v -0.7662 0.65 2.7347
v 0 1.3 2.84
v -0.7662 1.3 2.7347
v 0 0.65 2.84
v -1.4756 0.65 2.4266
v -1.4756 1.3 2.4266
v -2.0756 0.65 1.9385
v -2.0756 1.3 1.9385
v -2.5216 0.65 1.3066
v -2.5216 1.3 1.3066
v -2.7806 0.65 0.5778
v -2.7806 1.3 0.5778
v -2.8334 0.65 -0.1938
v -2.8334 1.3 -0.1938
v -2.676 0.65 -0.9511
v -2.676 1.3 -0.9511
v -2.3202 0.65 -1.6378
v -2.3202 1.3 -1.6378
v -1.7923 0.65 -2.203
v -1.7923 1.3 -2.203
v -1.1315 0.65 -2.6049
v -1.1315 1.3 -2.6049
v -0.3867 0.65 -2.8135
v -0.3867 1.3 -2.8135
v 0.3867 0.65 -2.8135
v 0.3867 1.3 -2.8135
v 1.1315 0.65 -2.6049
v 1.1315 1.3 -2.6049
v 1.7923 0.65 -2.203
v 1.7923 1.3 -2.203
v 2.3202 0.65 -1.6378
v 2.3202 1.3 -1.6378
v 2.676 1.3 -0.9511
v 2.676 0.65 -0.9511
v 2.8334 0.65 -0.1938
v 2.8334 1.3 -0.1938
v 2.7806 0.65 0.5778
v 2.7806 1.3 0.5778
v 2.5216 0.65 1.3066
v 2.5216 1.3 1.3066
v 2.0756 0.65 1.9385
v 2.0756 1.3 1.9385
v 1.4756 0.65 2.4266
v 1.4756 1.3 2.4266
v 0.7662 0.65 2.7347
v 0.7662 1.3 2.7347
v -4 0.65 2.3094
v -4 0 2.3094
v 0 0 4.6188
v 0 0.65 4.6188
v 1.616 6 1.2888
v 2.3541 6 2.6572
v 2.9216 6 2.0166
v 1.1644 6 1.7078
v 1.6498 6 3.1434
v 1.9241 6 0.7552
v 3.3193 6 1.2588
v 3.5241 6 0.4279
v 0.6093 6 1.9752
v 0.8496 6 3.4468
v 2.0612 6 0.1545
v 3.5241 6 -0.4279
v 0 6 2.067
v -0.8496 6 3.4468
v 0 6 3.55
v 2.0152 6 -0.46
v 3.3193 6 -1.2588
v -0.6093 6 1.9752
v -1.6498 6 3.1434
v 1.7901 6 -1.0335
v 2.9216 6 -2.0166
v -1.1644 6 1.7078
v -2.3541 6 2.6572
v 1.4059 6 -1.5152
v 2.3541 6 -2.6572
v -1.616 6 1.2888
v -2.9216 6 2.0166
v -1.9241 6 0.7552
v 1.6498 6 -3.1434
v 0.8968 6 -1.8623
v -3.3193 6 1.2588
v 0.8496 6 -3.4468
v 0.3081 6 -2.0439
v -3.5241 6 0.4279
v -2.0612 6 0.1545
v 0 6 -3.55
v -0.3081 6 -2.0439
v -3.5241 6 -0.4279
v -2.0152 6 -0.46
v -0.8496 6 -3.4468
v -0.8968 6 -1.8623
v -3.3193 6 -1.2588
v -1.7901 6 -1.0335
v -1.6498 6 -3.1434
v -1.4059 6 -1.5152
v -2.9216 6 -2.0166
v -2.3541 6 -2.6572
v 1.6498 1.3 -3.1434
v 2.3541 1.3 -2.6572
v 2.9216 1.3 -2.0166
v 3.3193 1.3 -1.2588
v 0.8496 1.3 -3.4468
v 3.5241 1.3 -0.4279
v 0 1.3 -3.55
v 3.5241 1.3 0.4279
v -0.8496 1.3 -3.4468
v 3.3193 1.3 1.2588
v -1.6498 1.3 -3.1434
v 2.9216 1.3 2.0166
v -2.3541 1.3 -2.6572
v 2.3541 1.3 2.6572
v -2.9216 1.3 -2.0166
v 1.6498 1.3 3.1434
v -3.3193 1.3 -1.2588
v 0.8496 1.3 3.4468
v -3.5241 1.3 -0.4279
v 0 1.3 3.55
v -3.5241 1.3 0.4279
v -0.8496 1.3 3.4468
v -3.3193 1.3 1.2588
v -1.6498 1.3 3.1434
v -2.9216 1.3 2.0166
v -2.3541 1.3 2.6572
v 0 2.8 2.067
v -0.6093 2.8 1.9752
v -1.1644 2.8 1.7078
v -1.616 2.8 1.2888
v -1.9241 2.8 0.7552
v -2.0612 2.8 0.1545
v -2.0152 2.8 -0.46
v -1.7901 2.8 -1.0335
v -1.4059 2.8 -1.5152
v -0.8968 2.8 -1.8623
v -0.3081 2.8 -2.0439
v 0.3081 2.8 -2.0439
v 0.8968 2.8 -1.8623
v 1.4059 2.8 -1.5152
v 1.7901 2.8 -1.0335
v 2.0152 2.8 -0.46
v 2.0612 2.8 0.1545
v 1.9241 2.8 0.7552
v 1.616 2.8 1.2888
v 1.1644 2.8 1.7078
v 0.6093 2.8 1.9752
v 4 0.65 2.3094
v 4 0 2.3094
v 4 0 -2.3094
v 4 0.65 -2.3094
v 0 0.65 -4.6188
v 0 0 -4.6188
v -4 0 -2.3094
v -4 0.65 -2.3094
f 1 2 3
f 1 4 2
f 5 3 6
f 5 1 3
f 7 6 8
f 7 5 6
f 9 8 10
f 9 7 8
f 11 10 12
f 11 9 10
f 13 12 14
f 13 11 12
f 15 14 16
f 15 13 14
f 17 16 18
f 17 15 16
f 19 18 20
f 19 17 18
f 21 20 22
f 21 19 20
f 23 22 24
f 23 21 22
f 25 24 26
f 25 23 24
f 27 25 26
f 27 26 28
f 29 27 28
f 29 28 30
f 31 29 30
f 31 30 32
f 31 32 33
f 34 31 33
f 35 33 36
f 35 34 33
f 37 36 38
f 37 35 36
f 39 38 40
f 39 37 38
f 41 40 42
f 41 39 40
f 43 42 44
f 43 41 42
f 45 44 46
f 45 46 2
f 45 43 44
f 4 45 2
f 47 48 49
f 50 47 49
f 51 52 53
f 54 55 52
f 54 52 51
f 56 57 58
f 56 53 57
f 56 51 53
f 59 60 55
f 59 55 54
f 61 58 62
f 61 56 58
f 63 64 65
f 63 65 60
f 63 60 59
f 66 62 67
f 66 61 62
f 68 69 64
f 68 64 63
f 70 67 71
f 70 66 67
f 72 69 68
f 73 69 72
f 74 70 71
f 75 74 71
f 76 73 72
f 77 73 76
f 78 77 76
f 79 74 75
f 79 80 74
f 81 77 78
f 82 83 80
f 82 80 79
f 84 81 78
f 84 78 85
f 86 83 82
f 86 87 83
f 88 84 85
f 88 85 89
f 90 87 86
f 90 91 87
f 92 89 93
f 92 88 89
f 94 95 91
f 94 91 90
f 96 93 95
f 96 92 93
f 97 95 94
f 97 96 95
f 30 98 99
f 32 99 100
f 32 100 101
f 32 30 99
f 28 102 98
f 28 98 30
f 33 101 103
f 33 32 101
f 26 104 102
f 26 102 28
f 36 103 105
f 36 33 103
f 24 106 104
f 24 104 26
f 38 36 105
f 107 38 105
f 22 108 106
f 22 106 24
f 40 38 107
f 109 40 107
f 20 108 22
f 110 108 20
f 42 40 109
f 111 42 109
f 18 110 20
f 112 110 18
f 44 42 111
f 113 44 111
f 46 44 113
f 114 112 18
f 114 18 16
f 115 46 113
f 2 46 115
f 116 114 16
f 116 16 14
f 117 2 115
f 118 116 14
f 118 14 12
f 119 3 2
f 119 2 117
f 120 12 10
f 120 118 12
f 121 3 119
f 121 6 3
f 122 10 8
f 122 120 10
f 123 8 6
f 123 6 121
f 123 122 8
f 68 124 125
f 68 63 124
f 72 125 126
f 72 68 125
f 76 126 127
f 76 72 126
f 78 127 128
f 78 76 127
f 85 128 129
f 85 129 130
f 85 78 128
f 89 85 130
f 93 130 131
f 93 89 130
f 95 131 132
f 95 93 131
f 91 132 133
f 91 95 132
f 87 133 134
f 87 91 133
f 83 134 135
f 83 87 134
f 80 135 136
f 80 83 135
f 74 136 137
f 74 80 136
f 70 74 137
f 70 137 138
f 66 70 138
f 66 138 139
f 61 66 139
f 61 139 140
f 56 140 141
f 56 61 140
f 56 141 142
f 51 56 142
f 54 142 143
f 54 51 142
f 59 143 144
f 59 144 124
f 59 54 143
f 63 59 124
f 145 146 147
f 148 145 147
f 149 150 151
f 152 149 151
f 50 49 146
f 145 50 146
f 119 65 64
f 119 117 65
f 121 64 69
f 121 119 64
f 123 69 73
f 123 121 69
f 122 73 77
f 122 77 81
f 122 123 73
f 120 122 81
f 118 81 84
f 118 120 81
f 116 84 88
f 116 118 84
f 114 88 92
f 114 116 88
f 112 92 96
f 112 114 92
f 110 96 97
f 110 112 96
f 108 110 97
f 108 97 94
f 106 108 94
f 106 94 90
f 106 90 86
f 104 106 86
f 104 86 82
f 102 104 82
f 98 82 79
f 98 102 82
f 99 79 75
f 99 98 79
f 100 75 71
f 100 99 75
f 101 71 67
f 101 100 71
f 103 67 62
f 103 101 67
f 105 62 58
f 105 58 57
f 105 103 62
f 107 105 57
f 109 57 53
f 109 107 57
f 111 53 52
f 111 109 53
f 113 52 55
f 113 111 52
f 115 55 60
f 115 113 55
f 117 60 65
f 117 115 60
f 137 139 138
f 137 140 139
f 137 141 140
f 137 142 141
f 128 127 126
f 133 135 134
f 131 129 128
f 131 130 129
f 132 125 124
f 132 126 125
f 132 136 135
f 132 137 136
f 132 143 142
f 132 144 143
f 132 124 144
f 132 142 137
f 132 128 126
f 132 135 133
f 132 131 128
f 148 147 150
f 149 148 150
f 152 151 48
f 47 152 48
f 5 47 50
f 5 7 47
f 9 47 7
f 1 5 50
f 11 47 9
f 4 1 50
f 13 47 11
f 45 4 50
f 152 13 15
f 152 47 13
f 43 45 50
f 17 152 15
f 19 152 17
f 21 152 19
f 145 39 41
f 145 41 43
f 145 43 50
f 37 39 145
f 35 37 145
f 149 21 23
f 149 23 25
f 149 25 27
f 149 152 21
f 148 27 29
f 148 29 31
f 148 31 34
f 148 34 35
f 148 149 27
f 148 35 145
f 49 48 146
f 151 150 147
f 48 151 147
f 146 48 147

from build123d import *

# Parameters (mm, degrees)
EXTRUDE_1_DEPTH = 0.65


with BuildPart() as part:
    # Эскиз1 → Бобышка-Вытянуть1 (new body)
    with BuildSketch(Plane(origin=(0, 0, 0), x_dir=(1, 0, 0), z_dir=(0, 1, 0))):
        Polygon((0, -4.618802154), (4, -2.309401077), (4, 2.309401077), (0, 4.618802154), (-4, 2.309401077), (-4, -2.309401077), align=None)
    extrude(amount=EXTRUDE_1_DEPTH)

    # Эскиз6 → Повернуть1 (revolve)
    with BuildSketch(Plane.XY, mode=Mode.PRIVATE) as revolve_1_sk:
        Polygon((3.55, 6), (3.55, 1.3), (2.84, 1.3), (2.84, 0.65), (0, 0.65), (0, 2.8), (2.067, 2.8), (2.067, 6), align=None)
    revolve(revolve_1_sk.sketch.rotate(Axis((0, 2.8, 0), (0, -1, 0)), 90), axis=Axis((0, 2.8, 0), (0, -1, 0)))


solid = part.part
